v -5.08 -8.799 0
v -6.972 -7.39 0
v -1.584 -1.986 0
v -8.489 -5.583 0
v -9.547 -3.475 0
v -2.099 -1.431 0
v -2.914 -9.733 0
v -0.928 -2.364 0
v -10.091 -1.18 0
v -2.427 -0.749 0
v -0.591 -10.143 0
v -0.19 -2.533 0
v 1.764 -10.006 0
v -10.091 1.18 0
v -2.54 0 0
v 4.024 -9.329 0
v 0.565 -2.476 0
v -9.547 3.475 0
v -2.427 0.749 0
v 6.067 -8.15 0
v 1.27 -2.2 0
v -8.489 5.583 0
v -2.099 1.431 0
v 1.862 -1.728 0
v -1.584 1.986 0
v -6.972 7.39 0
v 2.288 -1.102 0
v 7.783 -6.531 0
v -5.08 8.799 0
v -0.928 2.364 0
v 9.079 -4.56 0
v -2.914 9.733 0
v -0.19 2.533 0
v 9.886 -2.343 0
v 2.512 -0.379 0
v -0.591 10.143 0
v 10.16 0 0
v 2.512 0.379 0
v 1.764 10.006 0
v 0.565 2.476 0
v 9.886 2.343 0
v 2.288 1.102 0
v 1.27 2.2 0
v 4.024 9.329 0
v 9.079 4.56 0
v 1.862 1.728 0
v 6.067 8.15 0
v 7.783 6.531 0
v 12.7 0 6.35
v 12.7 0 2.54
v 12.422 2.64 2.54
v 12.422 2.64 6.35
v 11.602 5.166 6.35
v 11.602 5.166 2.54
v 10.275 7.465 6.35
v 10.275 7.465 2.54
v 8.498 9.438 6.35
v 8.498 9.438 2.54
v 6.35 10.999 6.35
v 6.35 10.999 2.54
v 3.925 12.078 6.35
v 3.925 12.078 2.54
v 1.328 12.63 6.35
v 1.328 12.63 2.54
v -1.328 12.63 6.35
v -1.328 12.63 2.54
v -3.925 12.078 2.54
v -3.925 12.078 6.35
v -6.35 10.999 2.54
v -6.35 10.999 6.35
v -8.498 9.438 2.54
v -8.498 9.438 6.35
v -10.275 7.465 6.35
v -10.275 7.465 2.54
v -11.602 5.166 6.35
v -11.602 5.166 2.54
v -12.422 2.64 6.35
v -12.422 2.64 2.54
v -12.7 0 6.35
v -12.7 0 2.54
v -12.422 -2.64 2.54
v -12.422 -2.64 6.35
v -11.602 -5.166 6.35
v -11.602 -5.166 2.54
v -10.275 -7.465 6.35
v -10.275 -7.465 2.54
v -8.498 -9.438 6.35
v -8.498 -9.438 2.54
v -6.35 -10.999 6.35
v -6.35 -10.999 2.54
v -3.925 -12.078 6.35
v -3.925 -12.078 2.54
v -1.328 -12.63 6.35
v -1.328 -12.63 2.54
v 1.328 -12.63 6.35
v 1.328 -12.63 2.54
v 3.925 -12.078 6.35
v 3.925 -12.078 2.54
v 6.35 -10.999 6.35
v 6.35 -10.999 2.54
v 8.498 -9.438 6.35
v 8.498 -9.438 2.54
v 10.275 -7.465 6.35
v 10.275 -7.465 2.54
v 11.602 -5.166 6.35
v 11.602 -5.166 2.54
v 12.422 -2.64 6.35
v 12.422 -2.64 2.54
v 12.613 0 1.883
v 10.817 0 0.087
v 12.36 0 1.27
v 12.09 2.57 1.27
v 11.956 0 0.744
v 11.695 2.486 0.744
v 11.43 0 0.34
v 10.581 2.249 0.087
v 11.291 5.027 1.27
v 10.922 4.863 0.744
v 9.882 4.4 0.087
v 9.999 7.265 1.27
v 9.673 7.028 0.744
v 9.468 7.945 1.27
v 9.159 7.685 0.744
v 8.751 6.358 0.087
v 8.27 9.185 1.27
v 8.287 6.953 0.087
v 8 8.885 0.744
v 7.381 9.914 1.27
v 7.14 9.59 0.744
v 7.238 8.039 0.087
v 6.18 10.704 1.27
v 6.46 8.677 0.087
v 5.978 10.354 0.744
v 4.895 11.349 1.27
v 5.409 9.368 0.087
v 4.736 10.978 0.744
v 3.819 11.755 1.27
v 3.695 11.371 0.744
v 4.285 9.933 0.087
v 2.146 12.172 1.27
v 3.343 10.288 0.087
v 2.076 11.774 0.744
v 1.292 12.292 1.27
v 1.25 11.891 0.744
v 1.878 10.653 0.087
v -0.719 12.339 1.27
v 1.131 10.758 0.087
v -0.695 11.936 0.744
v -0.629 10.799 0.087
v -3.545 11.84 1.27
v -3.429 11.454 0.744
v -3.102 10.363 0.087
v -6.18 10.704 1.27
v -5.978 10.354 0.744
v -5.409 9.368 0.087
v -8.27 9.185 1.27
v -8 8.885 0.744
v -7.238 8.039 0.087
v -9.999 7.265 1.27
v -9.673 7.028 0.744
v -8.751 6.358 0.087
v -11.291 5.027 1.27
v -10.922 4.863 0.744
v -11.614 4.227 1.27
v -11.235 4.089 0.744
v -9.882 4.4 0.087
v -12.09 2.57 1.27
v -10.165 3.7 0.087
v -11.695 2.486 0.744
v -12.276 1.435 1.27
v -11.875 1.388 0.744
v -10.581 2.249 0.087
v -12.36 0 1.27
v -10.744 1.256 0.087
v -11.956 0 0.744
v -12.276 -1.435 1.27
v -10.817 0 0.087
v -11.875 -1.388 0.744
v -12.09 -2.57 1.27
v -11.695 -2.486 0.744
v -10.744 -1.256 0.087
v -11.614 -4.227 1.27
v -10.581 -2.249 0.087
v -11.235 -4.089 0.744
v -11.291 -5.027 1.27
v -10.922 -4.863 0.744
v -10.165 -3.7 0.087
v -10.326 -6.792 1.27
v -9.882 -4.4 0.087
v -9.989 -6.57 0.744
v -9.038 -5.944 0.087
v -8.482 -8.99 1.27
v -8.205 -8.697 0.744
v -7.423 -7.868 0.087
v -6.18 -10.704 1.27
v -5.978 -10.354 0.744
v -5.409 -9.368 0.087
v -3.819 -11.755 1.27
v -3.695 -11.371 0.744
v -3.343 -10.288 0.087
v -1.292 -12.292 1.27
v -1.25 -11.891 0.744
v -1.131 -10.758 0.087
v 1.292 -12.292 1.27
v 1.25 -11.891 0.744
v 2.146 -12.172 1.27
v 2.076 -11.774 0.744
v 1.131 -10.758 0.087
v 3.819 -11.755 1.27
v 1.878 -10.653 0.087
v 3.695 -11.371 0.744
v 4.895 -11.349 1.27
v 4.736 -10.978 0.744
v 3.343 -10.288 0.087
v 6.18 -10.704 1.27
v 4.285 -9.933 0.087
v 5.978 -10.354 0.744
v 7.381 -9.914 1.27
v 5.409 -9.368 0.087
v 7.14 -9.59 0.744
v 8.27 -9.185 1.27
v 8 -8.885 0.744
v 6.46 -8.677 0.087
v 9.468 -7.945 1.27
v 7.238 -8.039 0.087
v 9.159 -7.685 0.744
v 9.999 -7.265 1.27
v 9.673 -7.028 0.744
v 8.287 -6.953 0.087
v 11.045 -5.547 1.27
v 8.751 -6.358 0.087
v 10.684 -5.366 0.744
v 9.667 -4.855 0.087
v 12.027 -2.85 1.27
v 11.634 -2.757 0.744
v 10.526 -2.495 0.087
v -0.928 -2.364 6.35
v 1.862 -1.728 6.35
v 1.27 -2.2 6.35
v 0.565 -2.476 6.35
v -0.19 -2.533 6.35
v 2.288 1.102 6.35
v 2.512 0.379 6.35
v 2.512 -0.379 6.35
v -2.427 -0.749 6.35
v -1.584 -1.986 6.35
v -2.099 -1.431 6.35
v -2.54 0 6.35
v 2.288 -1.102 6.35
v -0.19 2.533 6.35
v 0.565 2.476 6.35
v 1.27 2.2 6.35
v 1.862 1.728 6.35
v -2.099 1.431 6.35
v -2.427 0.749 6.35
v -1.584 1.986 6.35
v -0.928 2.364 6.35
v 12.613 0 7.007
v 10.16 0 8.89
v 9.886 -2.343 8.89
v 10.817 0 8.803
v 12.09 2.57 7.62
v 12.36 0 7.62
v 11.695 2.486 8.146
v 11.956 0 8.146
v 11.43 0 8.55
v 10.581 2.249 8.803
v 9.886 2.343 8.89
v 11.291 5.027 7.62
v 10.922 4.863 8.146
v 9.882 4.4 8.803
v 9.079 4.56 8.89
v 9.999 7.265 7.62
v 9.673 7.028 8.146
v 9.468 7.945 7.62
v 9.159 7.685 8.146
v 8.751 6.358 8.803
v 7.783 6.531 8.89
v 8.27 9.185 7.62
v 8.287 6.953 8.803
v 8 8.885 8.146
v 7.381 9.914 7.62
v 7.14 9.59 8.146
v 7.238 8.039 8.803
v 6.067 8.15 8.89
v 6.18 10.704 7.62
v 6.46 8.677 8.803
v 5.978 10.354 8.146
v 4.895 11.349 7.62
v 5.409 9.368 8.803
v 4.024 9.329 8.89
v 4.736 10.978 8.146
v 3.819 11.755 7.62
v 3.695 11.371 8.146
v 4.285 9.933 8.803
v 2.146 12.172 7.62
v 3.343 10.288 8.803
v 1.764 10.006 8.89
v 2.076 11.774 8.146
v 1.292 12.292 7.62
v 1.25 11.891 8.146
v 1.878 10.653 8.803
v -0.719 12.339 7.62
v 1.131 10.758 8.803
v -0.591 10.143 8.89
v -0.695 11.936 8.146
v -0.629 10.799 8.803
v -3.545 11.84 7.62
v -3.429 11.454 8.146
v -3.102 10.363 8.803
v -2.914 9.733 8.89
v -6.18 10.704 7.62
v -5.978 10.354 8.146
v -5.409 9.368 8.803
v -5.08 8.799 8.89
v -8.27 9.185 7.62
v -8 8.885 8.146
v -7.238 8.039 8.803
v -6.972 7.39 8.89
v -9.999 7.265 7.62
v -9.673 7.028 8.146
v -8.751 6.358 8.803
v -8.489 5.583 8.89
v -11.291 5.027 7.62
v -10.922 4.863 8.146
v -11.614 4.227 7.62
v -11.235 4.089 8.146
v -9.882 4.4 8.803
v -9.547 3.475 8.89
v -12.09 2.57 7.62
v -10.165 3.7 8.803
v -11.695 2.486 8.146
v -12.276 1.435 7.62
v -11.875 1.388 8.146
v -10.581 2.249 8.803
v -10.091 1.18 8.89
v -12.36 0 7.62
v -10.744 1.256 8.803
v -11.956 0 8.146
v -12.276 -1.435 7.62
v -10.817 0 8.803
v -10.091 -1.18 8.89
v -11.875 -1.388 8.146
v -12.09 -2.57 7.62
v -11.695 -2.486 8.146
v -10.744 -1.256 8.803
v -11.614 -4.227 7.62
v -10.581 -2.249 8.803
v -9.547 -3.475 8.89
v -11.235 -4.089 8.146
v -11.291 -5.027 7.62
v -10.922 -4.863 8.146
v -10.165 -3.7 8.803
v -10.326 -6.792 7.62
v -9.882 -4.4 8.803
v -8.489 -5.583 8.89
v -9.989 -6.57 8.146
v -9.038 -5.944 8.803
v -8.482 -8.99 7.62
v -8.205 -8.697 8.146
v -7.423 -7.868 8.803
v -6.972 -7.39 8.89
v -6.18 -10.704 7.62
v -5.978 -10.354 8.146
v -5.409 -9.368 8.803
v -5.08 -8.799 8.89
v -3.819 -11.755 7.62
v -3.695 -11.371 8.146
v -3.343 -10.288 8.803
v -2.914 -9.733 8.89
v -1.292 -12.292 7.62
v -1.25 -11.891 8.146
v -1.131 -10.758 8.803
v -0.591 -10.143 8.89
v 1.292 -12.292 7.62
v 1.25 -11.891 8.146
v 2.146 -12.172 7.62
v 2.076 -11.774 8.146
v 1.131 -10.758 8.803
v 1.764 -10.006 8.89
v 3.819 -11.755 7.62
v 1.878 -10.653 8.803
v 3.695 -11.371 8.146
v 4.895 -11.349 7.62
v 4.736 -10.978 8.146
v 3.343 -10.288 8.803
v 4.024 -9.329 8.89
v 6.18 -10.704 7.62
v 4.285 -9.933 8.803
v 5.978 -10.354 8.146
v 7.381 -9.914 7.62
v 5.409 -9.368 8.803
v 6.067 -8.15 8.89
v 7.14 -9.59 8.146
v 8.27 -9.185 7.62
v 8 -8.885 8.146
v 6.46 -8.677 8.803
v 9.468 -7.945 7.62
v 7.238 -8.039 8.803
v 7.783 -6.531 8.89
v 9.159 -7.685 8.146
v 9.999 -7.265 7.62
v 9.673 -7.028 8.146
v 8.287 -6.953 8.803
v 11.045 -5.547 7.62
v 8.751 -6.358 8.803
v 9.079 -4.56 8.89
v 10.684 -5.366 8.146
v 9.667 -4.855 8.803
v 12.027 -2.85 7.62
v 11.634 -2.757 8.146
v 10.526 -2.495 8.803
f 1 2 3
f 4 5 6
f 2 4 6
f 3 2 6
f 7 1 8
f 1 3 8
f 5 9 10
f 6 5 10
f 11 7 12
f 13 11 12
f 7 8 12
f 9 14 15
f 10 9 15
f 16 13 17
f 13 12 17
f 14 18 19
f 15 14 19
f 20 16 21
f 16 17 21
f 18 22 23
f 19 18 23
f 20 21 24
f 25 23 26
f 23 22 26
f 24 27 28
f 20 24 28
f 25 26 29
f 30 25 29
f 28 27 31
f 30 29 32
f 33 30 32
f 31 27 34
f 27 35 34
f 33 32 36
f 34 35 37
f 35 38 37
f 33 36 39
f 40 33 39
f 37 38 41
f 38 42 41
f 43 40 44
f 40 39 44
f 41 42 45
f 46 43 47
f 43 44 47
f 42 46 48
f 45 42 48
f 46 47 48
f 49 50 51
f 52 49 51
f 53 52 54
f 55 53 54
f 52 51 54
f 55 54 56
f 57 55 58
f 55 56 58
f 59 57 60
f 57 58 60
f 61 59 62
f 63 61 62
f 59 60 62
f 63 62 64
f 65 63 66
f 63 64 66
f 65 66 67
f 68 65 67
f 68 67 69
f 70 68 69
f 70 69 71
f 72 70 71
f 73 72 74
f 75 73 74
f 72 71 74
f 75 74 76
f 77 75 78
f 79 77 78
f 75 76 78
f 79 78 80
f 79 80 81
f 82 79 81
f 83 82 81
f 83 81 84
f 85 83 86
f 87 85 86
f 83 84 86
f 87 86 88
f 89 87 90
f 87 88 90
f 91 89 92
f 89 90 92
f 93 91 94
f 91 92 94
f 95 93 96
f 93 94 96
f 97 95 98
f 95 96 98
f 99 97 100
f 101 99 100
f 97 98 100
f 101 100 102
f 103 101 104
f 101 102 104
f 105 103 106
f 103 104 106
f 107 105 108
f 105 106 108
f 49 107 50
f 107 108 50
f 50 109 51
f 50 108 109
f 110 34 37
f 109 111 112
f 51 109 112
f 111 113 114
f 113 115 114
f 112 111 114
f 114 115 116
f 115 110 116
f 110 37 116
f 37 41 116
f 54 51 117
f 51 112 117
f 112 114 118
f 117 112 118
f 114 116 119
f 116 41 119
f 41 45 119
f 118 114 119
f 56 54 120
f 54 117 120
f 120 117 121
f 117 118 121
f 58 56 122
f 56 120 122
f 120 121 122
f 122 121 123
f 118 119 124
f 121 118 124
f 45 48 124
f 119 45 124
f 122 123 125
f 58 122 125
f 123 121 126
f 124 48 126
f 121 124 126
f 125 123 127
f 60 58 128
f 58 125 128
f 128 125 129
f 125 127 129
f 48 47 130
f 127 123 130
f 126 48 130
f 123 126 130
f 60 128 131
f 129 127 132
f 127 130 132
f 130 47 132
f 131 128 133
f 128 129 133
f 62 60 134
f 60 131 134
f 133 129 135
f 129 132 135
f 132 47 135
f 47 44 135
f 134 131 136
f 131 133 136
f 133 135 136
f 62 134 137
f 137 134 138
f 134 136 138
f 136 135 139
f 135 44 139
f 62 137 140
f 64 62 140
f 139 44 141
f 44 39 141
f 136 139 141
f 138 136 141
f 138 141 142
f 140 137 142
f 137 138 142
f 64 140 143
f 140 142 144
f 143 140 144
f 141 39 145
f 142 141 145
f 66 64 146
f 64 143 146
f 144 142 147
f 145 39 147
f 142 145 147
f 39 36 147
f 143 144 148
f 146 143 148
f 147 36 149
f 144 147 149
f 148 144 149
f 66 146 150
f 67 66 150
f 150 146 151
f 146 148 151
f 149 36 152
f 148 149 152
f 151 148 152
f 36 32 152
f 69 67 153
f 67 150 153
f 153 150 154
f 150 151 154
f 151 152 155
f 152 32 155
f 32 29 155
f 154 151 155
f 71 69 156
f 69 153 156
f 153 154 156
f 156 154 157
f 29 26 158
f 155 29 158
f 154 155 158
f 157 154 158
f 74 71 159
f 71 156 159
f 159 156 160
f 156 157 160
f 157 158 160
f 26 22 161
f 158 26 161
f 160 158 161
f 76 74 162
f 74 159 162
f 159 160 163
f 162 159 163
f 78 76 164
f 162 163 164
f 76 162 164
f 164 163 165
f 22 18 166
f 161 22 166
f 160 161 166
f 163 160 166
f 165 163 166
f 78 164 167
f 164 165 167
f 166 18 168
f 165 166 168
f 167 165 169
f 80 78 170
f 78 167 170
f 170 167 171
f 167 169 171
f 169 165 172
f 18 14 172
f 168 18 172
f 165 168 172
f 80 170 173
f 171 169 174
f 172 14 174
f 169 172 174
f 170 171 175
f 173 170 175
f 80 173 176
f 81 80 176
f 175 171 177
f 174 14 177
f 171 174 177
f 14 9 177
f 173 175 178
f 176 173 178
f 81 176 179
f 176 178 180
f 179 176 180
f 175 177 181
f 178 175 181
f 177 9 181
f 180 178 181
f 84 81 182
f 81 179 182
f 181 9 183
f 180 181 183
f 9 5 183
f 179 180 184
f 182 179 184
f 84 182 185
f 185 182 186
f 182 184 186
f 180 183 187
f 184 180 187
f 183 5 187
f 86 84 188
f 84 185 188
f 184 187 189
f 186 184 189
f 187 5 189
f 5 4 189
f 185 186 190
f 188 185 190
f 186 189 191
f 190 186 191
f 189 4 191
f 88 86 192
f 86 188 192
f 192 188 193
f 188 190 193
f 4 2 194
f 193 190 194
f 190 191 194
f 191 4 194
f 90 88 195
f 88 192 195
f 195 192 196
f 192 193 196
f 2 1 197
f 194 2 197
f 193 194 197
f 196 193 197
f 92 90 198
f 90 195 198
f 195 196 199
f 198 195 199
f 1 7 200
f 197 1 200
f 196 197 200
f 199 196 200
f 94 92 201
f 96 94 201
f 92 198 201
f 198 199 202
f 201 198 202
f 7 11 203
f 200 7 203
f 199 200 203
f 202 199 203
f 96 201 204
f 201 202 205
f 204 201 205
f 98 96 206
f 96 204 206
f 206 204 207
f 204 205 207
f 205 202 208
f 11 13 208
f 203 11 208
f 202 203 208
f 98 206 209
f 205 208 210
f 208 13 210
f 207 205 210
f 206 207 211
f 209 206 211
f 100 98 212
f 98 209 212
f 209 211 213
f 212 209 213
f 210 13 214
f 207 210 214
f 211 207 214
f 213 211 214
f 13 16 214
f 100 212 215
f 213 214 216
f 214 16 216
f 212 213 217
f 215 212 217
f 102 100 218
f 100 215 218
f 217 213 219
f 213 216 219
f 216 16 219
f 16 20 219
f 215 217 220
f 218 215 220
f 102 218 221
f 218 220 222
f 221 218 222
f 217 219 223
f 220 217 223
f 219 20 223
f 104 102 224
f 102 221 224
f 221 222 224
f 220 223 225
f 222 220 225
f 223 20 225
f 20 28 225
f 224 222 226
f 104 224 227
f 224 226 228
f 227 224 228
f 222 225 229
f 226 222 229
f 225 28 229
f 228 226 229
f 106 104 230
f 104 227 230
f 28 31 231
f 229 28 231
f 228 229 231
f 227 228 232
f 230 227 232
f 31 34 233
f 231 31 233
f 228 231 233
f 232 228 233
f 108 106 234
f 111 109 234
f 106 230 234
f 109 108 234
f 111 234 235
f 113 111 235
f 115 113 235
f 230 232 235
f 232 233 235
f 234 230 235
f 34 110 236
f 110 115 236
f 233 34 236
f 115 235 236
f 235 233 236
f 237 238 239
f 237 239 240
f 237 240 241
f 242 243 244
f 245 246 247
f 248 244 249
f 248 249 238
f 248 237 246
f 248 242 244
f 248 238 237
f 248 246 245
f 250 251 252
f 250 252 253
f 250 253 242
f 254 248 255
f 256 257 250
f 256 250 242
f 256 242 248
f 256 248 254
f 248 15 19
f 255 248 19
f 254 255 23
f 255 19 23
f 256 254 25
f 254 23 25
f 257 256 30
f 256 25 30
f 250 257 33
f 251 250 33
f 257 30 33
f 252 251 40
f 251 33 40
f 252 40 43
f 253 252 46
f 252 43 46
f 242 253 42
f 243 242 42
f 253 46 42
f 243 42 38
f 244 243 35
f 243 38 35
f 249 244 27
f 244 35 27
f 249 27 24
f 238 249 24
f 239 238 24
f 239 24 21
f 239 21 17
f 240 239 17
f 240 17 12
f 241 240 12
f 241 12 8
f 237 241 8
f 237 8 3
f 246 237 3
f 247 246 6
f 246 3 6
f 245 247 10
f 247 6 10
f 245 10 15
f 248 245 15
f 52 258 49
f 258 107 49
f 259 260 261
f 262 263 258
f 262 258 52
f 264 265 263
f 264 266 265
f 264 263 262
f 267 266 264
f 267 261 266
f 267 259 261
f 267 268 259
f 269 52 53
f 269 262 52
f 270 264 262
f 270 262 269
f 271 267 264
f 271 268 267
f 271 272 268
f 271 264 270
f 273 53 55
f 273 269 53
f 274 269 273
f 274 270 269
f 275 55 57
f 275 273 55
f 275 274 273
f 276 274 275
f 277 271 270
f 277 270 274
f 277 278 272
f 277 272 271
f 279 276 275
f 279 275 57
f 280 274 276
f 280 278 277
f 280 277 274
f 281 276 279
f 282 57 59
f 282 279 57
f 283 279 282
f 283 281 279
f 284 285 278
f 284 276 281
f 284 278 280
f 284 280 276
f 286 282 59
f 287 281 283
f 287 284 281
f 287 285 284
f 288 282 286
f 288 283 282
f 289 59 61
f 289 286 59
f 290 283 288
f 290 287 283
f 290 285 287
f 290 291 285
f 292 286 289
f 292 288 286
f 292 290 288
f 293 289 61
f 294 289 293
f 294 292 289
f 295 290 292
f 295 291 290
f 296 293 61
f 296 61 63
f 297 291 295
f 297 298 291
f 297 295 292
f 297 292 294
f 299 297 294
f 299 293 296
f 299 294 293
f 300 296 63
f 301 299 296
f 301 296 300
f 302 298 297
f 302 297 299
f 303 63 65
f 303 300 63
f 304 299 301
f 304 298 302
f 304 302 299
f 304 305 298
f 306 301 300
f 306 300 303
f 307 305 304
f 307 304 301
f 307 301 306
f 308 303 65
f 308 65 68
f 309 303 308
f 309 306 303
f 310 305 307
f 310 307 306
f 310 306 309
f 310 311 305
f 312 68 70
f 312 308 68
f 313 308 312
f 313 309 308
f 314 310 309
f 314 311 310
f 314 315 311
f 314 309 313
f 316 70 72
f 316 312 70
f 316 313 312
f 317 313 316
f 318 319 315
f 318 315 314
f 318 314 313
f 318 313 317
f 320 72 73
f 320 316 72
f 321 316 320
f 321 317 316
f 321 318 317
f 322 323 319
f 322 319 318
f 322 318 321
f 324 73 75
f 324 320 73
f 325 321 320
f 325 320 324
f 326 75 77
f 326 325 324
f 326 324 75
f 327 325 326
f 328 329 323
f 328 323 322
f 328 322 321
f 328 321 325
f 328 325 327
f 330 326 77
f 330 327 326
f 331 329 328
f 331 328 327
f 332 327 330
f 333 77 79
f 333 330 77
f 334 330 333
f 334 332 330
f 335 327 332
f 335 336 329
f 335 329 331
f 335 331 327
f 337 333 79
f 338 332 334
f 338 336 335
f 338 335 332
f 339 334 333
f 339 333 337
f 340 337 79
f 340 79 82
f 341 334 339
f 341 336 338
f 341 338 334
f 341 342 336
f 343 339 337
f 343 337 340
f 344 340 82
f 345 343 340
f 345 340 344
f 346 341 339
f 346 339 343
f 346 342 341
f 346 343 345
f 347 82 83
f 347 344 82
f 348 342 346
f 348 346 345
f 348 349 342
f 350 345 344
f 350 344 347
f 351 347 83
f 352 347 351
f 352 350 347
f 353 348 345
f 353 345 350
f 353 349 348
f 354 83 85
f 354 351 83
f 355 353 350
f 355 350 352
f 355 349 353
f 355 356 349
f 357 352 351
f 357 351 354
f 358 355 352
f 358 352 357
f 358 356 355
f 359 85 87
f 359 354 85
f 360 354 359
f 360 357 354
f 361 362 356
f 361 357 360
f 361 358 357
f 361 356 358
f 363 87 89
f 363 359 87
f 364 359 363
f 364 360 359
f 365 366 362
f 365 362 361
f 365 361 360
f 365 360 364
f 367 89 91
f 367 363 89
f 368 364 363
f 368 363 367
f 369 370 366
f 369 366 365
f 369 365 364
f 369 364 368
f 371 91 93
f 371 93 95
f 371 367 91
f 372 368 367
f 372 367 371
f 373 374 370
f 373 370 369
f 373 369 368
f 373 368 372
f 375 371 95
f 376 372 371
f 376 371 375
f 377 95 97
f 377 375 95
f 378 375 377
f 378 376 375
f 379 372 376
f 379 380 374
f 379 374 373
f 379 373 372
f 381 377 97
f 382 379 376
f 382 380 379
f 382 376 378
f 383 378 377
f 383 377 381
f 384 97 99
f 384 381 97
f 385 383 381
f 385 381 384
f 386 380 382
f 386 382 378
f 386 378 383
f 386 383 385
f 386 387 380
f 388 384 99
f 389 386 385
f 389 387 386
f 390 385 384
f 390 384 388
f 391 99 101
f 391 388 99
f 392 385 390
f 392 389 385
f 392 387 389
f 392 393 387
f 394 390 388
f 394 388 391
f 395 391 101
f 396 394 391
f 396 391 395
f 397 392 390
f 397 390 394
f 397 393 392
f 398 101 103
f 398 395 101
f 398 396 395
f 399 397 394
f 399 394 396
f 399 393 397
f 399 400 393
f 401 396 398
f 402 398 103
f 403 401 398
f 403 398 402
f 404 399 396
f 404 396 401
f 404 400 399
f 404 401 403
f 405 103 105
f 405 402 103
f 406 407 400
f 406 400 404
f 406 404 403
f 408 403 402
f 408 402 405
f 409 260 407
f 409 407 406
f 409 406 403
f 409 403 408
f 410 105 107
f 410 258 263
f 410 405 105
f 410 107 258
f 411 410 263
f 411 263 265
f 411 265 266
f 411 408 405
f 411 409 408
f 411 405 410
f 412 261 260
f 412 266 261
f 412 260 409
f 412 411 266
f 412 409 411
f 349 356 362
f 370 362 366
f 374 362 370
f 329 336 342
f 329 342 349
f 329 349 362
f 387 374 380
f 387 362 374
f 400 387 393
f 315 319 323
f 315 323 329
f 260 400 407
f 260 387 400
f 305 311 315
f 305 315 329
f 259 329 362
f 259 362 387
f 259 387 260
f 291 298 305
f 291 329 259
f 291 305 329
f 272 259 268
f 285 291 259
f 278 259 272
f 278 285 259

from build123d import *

# Parameters (mm, degrees)
SKETCH1_R           = 12.7
BOSS_EXTRUDE1_DEPTH = 8.89
SKETCH2_R           = 2.54
CUT_EXTRUDE1_DEPTH  = 6.35
FILLET1_R           = 2.54


with BuildPart() as part:
    # Sketch1 → Boss-Extrude1 (new body)
    with BuildSketch(Plane.XY):
        Circle(SKETCH1_R)
    extrude(amount=BOSS_EXTRUDE1_DEPTH)

    # Sketch2 → Cut-Extrude1 (cut)
    with BuildSketch(Plane(origin=(0, 0, 0), x_dir=(-1, 0, 0), z_dir=(0, 0, -1))):
        Circle(SKETCH2_R)
    extrude(amount=-CUT_EXTRUDE1_DEPTH, mode=Mode.SUBTRACT)

    # Fillet1
    fillet1_edges = [part.edges().sort_by_distance(p)[0] for p in [
        (-12.7, 0, 0),
        (-12.7, 0, 8.89),
    ]]
    fillet(fillet1_edges, radius=FILLET1_R)


solid = part.part
